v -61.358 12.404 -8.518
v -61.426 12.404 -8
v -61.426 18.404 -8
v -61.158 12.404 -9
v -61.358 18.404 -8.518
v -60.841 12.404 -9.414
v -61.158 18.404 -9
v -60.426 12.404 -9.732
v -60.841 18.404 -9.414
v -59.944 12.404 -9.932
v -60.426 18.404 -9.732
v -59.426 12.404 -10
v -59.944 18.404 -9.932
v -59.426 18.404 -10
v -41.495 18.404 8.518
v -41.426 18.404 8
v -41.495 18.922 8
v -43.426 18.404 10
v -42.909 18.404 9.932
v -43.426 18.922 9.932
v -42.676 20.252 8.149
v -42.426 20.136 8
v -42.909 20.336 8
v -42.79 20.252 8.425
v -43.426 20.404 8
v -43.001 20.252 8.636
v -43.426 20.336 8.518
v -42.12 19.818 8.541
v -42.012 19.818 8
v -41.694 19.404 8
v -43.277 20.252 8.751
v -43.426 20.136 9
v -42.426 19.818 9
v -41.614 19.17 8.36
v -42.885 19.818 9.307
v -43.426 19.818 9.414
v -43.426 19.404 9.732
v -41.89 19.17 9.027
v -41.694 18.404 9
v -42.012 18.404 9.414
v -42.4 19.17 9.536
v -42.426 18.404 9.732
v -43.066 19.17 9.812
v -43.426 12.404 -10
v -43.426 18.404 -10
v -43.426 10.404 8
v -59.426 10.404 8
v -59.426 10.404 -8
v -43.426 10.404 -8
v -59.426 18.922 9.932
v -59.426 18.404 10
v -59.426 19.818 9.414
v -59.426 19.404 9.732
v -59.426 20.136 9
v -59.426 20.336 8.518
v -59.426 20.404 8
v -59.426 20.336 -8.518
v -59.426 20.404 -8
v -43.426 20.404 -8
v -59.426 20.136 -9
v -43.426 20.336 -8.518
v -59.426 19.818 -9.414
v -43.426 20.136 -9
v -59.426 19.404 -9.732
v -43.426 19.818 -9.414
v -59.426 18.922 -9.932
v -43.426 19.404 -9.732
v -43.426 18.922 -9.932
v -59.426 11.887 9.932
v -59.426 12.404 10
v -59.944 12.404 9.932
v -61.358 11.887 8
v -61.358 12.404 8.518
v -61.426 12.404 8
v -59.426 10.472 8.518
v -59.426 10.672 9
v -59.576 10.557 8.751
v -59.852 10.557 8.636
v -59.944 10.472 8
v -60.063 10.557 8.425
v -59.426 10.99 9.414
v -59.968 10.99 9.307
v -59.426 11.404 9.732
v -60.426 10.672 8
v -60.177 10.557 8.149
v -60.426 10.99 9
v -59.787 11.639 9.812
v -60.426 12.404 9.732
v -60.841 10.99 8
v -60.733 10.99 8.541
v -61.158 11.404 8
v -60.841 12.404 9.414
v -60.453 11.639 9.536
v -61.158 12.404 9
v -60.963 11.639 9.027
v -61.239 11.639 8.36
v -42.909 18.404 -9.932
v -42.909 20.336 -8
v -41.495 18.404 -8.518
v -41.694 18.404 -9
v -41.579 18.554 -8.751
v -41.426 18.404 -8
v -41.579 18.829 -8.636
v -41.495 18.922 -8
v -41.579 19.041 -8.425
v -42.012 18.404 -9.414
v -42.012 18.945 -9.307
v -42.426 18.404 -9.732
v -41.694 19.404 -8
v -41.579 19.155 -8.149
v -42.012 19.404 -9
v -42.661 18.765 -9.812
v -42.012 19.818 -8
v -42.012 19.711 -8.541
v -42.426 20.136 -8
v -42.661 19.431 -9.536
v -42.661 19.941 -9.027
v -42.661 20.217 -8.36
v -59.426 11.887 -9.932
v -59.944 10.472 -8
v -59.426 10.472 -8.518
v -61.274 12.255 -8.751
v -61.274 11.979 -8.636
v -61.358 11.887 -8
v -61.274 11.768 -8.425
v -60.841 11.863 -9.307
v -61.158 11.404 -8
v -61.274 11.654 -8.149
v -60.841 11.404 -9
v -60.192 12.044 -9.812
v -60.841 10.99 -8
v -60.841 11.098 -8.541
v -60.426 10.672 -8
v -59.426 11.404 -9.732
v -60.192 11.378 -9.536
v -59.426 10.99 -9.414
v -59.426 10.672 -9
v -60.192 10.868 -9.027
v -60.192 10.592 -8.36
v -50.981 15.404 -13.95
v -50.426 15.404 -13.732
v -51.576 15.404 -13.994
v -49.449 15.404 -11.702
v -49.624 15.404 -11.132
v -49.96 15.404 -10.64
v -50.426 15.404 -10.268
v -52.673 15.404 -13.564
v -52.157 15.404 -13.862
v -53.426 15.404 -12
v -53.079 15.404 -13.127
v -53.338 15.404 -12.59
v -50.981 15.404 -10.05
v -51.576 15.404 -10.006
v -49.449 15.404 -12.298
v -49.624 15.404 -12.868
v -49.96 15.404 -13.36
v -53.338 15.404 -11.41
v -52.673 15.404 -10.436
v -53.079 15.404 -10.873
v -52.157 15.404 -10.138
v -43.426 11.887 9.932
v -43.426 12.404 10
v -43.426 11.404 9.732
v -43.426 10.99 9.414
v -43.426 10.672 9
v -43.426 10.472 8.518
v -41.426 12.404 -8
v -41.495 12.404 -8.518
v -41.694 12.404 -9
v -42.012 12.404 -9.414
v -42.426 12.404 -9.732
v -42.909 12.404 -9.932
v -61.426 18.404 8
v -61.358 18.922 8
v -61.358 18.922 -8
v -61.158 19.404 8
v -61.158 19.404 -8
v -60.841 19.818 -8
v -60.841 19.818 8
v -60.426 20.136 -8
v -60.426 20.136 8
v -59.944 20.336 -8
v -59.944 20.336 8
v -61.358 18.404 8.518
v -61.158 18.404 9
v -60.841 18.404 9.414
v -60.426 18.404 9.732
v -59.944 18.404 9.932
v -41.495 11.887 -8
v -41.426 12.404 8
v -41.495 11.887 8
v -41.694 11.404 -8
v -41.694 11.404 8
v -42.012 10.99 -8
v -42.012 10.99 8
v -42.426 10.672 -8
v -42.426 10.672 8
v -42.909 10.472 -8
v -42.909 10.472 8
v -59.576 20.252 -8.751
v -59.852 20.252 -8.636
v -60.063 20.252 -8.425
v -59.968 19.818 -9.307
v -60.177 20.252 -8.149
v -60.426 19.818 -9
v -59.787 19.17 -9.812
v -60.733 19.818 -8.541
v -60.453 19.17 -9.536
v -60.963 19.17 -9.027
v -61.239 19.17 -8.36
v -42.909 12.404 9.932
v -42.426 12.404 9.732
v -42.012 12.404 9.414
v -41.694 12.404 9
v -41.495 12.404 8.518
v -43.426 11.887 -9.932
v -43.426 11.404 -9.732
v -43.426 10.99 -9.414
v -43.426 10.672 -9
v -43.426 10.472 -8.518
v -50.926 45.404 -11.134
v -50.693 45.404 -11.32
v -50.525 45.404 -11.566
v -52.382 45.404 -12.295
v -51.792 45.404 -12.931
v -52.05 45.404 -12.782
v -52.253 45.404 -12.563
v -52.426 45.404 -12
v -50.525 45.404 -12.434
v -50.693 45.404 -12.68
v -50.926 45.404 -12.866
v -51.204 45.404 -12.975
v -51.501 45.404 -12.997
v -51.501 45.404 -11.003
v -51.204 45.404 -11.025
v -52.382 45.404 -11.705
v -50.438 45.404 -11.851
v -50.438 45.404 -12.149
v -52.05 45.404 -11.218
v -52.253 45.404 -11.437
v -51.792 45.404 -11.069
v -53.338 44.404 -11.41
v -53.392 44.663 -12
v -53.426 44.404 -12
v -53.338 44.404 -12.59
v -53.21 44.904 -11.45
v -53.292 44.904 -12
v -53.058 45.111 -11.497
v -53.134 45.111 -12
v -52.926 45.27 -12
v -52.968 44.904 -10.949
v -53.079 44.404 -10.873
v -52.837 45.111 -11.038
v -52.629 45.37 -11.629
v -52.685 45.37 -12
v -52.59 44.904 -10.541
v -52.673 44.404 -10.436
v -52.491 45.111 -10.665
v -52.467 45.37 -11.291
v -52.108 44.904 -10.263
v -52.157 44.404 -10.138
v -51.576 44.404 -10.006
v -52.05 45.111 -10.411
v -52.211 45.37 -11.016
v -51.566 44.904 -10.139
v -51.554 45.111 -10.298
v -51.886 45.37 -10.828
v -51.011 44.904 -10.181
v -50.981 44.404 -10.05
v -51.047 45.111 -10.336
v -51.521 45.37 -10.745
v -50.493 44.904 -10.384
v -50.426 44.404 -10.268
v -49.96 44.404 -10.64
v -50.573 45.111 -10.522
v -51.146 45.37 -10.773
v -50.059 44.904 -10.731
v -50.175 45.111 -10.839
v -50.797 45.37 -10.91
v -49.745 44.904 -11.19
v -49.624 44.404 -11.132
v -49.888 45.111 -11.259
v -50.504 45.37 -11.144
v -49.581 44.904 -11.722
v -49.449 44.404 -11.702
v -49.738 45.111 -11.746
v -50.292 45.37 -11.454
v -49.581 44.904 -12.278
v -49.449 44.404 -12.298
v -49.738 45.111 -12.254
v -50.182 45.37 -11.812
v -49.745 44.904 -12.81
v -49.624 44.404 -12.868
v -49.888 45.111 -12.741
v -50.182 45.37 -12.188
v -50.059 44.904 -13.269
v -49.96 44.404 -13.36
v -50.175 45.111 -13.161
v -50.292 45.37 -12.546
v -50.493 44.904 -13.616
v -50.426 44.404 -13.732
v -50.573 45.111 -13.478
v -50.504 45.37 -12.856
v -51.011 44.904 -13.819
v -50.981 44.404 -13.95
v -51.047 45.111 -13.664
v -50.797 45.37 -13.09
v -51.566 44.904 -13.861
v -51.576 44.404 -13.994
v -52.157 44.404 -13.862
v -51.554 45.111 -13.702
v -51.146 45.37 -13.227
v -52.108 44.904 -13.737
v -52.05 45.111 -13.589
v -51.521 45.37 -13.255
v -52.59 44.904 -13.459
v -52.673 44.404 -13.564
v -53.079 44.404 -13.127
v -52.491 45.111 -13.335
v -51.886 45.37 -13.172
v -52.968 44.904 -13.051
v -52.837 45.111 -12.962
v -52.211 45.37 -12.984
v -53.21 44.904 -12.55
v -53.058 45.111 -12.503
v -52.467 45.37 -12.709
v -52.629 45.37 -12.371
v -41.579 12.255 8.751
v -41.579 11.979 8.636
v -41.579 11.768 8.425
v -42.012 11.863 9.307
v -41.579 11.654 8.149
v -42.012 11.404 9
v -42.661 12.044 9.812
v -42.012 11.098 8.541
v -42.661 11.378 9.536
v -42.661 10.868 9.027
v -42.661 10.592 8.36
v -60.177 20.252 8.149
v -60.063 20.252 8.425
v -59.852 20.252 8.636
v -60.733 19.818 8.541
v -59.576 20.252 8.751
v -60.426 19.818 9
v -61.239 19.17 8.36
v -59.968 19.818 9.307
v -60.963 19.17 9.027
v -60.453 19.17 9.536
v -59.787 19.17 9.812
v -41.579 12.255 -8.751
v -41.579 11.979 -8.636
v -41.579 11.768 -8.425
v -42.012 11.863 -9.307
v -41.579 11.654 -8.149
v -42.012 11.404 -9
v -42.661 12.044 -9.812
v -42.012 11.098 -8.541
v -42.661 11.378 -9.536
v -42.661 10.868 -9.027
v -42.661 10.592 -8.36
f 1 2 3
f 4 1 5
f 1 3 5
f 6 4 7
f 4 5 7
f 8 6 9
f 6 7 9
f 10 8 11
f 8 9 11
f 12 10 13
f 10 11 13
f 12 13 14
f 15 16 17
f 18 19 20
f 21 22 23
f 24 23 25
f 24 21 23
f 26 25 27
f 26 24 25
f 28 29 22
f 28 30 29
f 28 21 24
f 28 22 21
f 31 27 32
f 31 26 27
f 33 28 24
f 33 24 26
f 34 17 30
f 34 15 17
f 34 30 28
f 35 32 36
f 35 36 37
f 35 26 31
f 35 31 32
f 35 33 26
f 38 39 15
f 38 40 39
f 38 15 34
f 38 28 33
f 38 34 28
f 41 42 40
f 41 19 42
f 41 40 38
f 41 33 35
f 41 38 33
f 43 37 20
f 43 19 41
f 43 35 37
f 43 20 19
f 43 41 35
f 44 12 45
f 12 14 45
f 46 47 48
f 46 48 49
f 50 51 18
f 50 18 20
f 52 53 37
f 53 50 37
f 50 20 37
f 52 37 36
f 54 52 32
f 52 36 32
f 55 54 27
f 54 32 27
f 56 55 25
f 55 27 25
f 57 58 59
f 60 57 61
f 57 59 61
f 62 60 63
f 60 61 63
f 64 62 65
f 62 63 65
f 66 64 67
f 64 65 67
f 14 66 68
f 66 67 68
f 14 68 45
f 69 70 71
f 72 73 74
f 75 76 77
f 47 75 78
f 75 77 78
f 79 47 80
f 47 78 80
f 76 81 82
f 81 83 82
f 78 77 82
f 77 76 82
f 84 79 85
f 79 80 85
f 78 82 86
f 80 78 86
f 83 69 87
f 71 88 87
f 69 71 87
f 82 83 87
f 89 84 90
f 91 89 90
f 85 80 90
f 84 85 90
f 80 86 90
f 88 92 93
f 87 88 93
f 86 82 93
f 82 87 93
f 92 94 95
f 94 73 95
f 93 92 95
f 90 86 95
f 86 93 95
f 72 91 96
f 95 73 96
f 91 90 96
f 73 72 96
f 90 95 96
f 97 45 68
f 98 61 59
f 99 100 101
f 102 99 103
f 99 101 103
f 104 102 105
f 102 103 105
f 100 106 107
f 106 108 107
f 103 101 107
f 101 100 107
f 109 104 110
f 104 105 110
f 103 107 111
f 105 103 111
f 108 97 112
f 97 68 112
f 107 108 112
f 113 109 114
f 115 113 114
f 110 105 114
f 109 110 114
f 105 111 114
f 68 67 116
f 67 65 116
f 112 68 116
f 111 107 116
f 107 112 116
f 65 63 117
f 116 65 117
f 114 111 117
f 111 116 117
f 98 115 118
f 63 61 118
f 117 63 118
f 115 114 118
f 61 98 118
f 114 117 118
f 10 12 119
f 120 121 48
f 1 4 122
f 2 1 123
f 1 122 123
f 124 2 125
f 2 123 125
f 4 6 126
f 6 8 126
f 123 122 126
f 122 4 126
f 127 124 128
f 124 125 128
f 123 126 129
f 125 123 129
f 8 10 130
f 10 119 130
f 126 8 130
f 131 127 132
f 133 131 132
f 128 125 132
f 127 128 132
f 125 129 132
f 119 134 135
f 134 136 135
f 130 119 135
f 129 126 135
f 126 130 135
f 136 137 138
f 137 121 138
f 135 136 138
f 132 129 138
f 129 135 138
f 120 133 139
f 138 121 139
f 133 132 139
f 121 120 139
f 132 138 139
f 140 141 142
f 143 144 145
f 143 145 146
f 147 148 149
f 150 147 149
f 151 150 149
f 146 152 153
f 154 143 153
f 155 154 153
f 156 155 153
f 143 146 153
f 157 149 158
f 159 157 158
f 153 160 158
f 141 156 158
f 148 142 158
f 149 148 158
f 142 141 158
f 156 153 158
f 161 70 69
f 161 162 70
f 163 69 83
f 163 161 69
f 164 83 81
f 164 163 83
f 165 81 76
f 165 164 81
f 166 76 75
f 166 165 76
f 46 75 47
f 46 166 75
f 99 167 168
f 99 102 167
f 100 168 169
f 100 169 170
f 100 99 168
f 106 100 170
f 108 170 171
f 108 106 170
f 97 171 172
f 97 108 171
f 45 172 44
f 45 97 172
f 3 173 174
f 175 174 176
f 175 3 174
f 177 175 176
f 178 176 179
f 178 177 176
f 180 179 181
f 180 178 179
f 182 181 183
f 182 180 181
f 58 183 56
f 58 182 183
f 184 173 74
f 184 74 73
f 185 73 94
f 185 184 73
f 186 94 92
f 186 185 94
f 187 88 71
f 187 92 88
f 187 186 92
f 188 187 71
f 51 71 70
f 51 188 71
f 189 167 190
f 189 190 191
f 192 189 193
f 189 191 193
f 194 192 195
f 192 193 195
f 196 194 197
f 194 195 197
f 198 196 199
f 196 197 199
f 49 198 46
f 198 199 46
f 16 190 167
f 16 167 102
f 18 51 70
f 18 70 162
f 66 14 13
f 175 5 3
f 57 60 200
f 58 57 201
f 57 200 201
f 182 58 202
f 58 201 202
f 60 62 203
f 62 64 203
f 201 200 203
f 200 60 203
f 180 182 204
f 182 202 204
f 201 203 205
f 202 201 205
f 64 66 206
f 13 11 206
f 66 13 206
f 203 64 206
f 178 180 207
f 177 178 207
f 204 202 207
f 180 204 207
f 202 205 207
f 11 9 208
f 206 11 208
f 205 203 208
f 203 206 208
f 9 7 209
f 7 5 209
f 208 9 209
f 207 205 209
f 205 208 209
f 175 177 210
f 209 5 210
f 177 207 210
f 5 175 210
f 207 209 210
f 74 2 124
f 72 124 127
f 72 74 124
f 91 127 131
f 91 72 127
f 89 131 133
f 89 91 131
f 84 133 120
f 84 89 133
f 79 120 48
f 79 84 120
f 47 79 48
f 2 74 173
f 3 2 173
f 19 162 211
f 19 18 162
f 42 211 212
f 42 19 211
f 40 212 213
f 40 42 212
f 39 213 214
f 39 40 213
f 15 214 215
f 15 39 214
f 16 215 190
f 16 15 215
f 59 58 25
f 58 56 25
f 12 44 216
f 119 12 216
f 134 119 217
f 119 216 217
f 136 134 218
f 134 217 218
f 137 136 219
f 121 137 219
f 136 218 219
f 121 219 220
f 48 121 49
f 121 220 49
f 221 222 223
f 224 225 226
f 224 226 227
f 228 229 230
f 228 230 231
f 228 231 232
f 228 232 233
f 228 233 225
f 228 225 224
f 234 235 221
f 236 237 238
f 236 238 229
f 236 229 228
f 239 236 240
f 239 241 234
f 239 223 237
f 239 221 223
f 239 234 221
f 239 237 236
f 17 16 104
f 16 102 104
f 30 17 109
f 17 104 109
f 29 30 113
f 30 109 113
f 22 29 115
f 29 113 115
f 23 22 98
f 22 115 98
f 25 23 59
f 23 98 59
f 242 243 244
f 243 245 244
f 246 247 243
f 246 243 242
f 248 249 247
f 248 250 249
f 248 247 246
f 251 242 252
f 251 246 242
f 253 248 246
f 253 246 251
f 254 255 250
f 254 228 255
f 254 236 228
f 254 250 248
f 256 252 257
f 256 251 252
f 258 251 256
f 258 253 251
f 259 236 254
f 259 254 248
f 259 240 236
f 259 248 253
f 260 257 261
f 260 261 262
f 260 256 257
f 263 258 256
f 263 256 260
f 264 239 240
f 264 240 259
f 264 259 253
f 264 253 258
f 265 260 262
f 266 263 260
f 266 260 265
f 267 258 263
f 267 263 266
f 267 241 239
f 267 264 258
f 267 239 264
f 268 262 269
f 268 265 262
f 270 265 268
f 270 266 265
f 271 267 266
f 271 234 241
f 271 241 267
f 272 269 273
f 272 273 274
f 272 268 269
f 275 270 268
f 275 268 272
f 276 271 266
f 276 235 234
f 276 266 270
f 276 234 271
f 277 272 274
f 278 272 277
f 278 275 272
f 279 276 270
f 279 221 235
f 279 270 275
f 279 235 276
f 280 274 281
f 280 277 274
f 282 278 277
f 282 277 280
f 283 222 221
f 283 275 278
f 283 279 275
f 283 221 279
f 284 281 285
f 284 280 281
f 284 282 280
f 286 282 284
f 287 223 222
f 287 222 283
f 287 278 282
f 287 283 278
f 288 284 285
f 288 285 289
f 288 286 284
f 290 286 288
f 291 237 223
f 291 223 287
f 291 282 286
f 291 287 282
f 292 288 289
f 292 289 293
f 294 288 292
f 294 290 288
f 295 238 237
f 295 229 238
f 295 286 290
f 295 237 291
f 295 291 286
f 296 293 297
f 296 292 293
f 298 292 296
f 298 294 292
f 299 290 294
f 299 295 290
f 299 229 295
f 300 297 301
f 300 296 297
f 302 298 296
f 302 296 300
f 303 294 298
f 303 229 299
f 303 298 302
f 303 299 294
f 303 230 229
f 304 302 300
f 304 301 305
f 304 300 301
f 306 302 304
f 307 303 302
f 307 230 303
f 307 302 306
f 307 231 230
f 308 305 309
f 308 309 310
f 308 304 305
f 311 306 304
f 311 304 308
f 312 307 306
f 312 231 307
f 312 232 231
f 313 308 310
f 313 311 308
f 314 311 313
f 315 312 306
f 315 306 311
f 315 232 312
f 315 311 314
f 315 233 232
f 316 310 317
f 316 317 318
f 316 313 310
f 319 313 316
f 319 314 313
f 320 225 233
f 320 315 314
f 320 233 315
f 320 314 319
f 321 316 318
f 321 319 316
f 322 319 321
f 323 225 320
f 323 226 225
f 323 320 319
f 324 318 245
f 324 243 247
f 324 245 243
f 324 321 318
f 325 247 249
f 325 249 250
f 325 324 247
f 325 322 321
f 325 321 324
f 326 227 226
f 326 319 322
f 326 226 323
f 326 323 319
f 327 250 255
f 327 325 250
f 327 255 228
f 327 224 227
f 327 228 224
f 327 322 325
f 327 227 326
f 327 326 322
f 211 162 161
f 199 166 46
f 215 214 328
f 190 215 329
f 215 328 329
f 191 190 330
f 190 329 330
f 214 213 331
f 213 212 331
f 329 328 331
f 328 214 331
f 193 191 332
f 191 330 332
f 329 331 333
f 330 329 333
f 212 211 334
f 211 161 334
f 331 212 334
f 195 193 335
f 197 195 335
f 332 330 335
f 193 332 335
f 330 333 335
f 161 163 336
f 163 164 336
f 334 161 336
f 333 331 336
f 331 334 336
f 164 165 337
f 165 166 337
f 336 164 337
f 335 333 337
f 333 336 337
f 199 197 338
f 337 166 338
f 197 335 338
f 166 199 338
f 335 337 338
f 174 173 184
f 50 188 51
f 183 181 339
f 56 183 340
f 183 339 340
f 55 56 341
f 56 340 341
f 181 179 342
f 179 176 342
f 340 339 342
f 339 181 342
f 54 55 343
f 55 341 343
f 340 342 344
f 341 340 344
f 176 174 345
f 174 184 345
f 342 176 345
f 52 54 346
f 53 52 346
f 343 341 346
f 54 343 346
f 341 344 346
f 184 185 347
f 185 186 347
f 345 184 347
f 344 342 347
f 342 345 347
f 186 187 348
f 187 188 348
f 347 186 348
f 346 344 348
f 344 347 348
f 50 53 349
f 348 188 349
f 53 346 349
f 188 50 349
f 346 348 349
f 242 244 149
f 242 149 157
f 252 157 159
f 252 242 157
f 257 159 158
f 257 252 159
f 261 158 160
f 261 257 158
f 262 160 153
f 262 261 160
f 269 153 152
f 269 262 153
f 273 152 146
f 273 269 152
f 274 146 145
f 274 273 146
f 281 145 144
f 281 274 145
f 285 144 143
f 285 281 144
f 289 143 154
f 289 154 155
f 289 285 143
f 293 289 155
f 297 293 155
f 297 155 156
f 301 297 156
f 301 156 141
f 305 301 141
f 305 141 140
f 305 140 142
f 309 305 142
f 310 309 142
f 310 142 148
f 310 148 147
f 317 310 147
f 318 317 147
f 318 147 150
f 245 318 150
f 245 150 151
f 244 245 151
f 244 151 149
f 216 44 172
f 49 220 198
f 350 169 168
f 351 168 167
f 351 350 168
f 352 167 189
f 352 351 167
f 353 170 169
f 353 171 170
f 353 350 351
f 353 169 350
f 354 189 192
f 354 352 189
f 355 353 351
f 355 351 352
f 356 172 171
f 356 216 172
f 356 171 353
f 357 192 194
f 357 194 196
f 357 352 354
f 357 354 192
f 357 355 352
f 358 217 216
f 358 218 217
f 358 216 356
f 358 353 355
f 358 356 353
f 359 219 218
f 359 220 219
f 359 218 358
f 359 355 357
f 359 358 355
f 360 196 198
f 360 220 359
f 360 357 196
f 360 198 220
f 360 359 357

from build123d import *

# Parameters (mm, degrees)
SKETCH2_W           = 20
SKETCH2_H           = 10
BOSS_EXTRUDE1_DEPTH = 10
FILLET1_R           = 2
BOSS_EXTRUDE2_START = 10
SKETCH4_R           = 2
BOSS_EXTRUDE2_DEPTH = 15
FILLET2_R           = 1


with BuildPart() as part:
    # Sketch2 → Boss-Extrude1 (new, symmetric)
    with BuildSketch(Plane.XY):
        with Locations((-51.426434777, 15.404281135)):
            Rectangle(SKETCH2_W, SKETCH2_H)
    extrude(amount=BOSS_EXTRUDE1_DEPTH, both=True)

    # Fillet1
    fillet1_edges = [part.edges().sort_by_distance(p)[0] for p in [
        (-61.426434777, 15.404281135, 10),
        (-51.426434777, 10.404281135, 10),
        (-41.426434777, 15.404281135, 10),
        (-51.426434777, 10.404281135, -10),
        (-61.426434777, 15.404281135, -10),
        (-51.426434777, 20.404281135, -10),
        (-41.426434777, 15.404281135, -10),
        (-41.426434777, 10.404281135, 0),
        (-61.426434777, 10.404281135, 0),
        (-61.426434777, 20.404281135, 0),
        (-41.426434777, 20.404281135, 0),
        (-51.426434777, 20.404281135, 10),
    ]]
    fillet(fillet1_edges, radius=FILLET1_R)


with BuildPart() as body_2:
    # Sketch4 → Boss-Extrude2 (new, symmetric)
    with BuildSketch(Plane(origin=(0, 20.404281135, 0), x_dir=(1, 0, 0), z_dir=(0, 1, 0)).offset(BOSS_EXTRUDE2_START)):
        with Locations(Location((-51.426434777, 12, 0), (0, 0, 180))):
            Circle(SKETCH4_R)
    extrude(amount=BOSS_EXTRUDE2_DEPTH, both=True)

    # Fillet2
    fillet2_edges = [body_2.edges().sort_by_distance(p)[0] for p in [
        (-49.426434777, 45.404281135, -12),
    ]]
    fillet(fillet2_edges, radius=FILLET2_R)


solid = Compound([part.part, body_2.part])
